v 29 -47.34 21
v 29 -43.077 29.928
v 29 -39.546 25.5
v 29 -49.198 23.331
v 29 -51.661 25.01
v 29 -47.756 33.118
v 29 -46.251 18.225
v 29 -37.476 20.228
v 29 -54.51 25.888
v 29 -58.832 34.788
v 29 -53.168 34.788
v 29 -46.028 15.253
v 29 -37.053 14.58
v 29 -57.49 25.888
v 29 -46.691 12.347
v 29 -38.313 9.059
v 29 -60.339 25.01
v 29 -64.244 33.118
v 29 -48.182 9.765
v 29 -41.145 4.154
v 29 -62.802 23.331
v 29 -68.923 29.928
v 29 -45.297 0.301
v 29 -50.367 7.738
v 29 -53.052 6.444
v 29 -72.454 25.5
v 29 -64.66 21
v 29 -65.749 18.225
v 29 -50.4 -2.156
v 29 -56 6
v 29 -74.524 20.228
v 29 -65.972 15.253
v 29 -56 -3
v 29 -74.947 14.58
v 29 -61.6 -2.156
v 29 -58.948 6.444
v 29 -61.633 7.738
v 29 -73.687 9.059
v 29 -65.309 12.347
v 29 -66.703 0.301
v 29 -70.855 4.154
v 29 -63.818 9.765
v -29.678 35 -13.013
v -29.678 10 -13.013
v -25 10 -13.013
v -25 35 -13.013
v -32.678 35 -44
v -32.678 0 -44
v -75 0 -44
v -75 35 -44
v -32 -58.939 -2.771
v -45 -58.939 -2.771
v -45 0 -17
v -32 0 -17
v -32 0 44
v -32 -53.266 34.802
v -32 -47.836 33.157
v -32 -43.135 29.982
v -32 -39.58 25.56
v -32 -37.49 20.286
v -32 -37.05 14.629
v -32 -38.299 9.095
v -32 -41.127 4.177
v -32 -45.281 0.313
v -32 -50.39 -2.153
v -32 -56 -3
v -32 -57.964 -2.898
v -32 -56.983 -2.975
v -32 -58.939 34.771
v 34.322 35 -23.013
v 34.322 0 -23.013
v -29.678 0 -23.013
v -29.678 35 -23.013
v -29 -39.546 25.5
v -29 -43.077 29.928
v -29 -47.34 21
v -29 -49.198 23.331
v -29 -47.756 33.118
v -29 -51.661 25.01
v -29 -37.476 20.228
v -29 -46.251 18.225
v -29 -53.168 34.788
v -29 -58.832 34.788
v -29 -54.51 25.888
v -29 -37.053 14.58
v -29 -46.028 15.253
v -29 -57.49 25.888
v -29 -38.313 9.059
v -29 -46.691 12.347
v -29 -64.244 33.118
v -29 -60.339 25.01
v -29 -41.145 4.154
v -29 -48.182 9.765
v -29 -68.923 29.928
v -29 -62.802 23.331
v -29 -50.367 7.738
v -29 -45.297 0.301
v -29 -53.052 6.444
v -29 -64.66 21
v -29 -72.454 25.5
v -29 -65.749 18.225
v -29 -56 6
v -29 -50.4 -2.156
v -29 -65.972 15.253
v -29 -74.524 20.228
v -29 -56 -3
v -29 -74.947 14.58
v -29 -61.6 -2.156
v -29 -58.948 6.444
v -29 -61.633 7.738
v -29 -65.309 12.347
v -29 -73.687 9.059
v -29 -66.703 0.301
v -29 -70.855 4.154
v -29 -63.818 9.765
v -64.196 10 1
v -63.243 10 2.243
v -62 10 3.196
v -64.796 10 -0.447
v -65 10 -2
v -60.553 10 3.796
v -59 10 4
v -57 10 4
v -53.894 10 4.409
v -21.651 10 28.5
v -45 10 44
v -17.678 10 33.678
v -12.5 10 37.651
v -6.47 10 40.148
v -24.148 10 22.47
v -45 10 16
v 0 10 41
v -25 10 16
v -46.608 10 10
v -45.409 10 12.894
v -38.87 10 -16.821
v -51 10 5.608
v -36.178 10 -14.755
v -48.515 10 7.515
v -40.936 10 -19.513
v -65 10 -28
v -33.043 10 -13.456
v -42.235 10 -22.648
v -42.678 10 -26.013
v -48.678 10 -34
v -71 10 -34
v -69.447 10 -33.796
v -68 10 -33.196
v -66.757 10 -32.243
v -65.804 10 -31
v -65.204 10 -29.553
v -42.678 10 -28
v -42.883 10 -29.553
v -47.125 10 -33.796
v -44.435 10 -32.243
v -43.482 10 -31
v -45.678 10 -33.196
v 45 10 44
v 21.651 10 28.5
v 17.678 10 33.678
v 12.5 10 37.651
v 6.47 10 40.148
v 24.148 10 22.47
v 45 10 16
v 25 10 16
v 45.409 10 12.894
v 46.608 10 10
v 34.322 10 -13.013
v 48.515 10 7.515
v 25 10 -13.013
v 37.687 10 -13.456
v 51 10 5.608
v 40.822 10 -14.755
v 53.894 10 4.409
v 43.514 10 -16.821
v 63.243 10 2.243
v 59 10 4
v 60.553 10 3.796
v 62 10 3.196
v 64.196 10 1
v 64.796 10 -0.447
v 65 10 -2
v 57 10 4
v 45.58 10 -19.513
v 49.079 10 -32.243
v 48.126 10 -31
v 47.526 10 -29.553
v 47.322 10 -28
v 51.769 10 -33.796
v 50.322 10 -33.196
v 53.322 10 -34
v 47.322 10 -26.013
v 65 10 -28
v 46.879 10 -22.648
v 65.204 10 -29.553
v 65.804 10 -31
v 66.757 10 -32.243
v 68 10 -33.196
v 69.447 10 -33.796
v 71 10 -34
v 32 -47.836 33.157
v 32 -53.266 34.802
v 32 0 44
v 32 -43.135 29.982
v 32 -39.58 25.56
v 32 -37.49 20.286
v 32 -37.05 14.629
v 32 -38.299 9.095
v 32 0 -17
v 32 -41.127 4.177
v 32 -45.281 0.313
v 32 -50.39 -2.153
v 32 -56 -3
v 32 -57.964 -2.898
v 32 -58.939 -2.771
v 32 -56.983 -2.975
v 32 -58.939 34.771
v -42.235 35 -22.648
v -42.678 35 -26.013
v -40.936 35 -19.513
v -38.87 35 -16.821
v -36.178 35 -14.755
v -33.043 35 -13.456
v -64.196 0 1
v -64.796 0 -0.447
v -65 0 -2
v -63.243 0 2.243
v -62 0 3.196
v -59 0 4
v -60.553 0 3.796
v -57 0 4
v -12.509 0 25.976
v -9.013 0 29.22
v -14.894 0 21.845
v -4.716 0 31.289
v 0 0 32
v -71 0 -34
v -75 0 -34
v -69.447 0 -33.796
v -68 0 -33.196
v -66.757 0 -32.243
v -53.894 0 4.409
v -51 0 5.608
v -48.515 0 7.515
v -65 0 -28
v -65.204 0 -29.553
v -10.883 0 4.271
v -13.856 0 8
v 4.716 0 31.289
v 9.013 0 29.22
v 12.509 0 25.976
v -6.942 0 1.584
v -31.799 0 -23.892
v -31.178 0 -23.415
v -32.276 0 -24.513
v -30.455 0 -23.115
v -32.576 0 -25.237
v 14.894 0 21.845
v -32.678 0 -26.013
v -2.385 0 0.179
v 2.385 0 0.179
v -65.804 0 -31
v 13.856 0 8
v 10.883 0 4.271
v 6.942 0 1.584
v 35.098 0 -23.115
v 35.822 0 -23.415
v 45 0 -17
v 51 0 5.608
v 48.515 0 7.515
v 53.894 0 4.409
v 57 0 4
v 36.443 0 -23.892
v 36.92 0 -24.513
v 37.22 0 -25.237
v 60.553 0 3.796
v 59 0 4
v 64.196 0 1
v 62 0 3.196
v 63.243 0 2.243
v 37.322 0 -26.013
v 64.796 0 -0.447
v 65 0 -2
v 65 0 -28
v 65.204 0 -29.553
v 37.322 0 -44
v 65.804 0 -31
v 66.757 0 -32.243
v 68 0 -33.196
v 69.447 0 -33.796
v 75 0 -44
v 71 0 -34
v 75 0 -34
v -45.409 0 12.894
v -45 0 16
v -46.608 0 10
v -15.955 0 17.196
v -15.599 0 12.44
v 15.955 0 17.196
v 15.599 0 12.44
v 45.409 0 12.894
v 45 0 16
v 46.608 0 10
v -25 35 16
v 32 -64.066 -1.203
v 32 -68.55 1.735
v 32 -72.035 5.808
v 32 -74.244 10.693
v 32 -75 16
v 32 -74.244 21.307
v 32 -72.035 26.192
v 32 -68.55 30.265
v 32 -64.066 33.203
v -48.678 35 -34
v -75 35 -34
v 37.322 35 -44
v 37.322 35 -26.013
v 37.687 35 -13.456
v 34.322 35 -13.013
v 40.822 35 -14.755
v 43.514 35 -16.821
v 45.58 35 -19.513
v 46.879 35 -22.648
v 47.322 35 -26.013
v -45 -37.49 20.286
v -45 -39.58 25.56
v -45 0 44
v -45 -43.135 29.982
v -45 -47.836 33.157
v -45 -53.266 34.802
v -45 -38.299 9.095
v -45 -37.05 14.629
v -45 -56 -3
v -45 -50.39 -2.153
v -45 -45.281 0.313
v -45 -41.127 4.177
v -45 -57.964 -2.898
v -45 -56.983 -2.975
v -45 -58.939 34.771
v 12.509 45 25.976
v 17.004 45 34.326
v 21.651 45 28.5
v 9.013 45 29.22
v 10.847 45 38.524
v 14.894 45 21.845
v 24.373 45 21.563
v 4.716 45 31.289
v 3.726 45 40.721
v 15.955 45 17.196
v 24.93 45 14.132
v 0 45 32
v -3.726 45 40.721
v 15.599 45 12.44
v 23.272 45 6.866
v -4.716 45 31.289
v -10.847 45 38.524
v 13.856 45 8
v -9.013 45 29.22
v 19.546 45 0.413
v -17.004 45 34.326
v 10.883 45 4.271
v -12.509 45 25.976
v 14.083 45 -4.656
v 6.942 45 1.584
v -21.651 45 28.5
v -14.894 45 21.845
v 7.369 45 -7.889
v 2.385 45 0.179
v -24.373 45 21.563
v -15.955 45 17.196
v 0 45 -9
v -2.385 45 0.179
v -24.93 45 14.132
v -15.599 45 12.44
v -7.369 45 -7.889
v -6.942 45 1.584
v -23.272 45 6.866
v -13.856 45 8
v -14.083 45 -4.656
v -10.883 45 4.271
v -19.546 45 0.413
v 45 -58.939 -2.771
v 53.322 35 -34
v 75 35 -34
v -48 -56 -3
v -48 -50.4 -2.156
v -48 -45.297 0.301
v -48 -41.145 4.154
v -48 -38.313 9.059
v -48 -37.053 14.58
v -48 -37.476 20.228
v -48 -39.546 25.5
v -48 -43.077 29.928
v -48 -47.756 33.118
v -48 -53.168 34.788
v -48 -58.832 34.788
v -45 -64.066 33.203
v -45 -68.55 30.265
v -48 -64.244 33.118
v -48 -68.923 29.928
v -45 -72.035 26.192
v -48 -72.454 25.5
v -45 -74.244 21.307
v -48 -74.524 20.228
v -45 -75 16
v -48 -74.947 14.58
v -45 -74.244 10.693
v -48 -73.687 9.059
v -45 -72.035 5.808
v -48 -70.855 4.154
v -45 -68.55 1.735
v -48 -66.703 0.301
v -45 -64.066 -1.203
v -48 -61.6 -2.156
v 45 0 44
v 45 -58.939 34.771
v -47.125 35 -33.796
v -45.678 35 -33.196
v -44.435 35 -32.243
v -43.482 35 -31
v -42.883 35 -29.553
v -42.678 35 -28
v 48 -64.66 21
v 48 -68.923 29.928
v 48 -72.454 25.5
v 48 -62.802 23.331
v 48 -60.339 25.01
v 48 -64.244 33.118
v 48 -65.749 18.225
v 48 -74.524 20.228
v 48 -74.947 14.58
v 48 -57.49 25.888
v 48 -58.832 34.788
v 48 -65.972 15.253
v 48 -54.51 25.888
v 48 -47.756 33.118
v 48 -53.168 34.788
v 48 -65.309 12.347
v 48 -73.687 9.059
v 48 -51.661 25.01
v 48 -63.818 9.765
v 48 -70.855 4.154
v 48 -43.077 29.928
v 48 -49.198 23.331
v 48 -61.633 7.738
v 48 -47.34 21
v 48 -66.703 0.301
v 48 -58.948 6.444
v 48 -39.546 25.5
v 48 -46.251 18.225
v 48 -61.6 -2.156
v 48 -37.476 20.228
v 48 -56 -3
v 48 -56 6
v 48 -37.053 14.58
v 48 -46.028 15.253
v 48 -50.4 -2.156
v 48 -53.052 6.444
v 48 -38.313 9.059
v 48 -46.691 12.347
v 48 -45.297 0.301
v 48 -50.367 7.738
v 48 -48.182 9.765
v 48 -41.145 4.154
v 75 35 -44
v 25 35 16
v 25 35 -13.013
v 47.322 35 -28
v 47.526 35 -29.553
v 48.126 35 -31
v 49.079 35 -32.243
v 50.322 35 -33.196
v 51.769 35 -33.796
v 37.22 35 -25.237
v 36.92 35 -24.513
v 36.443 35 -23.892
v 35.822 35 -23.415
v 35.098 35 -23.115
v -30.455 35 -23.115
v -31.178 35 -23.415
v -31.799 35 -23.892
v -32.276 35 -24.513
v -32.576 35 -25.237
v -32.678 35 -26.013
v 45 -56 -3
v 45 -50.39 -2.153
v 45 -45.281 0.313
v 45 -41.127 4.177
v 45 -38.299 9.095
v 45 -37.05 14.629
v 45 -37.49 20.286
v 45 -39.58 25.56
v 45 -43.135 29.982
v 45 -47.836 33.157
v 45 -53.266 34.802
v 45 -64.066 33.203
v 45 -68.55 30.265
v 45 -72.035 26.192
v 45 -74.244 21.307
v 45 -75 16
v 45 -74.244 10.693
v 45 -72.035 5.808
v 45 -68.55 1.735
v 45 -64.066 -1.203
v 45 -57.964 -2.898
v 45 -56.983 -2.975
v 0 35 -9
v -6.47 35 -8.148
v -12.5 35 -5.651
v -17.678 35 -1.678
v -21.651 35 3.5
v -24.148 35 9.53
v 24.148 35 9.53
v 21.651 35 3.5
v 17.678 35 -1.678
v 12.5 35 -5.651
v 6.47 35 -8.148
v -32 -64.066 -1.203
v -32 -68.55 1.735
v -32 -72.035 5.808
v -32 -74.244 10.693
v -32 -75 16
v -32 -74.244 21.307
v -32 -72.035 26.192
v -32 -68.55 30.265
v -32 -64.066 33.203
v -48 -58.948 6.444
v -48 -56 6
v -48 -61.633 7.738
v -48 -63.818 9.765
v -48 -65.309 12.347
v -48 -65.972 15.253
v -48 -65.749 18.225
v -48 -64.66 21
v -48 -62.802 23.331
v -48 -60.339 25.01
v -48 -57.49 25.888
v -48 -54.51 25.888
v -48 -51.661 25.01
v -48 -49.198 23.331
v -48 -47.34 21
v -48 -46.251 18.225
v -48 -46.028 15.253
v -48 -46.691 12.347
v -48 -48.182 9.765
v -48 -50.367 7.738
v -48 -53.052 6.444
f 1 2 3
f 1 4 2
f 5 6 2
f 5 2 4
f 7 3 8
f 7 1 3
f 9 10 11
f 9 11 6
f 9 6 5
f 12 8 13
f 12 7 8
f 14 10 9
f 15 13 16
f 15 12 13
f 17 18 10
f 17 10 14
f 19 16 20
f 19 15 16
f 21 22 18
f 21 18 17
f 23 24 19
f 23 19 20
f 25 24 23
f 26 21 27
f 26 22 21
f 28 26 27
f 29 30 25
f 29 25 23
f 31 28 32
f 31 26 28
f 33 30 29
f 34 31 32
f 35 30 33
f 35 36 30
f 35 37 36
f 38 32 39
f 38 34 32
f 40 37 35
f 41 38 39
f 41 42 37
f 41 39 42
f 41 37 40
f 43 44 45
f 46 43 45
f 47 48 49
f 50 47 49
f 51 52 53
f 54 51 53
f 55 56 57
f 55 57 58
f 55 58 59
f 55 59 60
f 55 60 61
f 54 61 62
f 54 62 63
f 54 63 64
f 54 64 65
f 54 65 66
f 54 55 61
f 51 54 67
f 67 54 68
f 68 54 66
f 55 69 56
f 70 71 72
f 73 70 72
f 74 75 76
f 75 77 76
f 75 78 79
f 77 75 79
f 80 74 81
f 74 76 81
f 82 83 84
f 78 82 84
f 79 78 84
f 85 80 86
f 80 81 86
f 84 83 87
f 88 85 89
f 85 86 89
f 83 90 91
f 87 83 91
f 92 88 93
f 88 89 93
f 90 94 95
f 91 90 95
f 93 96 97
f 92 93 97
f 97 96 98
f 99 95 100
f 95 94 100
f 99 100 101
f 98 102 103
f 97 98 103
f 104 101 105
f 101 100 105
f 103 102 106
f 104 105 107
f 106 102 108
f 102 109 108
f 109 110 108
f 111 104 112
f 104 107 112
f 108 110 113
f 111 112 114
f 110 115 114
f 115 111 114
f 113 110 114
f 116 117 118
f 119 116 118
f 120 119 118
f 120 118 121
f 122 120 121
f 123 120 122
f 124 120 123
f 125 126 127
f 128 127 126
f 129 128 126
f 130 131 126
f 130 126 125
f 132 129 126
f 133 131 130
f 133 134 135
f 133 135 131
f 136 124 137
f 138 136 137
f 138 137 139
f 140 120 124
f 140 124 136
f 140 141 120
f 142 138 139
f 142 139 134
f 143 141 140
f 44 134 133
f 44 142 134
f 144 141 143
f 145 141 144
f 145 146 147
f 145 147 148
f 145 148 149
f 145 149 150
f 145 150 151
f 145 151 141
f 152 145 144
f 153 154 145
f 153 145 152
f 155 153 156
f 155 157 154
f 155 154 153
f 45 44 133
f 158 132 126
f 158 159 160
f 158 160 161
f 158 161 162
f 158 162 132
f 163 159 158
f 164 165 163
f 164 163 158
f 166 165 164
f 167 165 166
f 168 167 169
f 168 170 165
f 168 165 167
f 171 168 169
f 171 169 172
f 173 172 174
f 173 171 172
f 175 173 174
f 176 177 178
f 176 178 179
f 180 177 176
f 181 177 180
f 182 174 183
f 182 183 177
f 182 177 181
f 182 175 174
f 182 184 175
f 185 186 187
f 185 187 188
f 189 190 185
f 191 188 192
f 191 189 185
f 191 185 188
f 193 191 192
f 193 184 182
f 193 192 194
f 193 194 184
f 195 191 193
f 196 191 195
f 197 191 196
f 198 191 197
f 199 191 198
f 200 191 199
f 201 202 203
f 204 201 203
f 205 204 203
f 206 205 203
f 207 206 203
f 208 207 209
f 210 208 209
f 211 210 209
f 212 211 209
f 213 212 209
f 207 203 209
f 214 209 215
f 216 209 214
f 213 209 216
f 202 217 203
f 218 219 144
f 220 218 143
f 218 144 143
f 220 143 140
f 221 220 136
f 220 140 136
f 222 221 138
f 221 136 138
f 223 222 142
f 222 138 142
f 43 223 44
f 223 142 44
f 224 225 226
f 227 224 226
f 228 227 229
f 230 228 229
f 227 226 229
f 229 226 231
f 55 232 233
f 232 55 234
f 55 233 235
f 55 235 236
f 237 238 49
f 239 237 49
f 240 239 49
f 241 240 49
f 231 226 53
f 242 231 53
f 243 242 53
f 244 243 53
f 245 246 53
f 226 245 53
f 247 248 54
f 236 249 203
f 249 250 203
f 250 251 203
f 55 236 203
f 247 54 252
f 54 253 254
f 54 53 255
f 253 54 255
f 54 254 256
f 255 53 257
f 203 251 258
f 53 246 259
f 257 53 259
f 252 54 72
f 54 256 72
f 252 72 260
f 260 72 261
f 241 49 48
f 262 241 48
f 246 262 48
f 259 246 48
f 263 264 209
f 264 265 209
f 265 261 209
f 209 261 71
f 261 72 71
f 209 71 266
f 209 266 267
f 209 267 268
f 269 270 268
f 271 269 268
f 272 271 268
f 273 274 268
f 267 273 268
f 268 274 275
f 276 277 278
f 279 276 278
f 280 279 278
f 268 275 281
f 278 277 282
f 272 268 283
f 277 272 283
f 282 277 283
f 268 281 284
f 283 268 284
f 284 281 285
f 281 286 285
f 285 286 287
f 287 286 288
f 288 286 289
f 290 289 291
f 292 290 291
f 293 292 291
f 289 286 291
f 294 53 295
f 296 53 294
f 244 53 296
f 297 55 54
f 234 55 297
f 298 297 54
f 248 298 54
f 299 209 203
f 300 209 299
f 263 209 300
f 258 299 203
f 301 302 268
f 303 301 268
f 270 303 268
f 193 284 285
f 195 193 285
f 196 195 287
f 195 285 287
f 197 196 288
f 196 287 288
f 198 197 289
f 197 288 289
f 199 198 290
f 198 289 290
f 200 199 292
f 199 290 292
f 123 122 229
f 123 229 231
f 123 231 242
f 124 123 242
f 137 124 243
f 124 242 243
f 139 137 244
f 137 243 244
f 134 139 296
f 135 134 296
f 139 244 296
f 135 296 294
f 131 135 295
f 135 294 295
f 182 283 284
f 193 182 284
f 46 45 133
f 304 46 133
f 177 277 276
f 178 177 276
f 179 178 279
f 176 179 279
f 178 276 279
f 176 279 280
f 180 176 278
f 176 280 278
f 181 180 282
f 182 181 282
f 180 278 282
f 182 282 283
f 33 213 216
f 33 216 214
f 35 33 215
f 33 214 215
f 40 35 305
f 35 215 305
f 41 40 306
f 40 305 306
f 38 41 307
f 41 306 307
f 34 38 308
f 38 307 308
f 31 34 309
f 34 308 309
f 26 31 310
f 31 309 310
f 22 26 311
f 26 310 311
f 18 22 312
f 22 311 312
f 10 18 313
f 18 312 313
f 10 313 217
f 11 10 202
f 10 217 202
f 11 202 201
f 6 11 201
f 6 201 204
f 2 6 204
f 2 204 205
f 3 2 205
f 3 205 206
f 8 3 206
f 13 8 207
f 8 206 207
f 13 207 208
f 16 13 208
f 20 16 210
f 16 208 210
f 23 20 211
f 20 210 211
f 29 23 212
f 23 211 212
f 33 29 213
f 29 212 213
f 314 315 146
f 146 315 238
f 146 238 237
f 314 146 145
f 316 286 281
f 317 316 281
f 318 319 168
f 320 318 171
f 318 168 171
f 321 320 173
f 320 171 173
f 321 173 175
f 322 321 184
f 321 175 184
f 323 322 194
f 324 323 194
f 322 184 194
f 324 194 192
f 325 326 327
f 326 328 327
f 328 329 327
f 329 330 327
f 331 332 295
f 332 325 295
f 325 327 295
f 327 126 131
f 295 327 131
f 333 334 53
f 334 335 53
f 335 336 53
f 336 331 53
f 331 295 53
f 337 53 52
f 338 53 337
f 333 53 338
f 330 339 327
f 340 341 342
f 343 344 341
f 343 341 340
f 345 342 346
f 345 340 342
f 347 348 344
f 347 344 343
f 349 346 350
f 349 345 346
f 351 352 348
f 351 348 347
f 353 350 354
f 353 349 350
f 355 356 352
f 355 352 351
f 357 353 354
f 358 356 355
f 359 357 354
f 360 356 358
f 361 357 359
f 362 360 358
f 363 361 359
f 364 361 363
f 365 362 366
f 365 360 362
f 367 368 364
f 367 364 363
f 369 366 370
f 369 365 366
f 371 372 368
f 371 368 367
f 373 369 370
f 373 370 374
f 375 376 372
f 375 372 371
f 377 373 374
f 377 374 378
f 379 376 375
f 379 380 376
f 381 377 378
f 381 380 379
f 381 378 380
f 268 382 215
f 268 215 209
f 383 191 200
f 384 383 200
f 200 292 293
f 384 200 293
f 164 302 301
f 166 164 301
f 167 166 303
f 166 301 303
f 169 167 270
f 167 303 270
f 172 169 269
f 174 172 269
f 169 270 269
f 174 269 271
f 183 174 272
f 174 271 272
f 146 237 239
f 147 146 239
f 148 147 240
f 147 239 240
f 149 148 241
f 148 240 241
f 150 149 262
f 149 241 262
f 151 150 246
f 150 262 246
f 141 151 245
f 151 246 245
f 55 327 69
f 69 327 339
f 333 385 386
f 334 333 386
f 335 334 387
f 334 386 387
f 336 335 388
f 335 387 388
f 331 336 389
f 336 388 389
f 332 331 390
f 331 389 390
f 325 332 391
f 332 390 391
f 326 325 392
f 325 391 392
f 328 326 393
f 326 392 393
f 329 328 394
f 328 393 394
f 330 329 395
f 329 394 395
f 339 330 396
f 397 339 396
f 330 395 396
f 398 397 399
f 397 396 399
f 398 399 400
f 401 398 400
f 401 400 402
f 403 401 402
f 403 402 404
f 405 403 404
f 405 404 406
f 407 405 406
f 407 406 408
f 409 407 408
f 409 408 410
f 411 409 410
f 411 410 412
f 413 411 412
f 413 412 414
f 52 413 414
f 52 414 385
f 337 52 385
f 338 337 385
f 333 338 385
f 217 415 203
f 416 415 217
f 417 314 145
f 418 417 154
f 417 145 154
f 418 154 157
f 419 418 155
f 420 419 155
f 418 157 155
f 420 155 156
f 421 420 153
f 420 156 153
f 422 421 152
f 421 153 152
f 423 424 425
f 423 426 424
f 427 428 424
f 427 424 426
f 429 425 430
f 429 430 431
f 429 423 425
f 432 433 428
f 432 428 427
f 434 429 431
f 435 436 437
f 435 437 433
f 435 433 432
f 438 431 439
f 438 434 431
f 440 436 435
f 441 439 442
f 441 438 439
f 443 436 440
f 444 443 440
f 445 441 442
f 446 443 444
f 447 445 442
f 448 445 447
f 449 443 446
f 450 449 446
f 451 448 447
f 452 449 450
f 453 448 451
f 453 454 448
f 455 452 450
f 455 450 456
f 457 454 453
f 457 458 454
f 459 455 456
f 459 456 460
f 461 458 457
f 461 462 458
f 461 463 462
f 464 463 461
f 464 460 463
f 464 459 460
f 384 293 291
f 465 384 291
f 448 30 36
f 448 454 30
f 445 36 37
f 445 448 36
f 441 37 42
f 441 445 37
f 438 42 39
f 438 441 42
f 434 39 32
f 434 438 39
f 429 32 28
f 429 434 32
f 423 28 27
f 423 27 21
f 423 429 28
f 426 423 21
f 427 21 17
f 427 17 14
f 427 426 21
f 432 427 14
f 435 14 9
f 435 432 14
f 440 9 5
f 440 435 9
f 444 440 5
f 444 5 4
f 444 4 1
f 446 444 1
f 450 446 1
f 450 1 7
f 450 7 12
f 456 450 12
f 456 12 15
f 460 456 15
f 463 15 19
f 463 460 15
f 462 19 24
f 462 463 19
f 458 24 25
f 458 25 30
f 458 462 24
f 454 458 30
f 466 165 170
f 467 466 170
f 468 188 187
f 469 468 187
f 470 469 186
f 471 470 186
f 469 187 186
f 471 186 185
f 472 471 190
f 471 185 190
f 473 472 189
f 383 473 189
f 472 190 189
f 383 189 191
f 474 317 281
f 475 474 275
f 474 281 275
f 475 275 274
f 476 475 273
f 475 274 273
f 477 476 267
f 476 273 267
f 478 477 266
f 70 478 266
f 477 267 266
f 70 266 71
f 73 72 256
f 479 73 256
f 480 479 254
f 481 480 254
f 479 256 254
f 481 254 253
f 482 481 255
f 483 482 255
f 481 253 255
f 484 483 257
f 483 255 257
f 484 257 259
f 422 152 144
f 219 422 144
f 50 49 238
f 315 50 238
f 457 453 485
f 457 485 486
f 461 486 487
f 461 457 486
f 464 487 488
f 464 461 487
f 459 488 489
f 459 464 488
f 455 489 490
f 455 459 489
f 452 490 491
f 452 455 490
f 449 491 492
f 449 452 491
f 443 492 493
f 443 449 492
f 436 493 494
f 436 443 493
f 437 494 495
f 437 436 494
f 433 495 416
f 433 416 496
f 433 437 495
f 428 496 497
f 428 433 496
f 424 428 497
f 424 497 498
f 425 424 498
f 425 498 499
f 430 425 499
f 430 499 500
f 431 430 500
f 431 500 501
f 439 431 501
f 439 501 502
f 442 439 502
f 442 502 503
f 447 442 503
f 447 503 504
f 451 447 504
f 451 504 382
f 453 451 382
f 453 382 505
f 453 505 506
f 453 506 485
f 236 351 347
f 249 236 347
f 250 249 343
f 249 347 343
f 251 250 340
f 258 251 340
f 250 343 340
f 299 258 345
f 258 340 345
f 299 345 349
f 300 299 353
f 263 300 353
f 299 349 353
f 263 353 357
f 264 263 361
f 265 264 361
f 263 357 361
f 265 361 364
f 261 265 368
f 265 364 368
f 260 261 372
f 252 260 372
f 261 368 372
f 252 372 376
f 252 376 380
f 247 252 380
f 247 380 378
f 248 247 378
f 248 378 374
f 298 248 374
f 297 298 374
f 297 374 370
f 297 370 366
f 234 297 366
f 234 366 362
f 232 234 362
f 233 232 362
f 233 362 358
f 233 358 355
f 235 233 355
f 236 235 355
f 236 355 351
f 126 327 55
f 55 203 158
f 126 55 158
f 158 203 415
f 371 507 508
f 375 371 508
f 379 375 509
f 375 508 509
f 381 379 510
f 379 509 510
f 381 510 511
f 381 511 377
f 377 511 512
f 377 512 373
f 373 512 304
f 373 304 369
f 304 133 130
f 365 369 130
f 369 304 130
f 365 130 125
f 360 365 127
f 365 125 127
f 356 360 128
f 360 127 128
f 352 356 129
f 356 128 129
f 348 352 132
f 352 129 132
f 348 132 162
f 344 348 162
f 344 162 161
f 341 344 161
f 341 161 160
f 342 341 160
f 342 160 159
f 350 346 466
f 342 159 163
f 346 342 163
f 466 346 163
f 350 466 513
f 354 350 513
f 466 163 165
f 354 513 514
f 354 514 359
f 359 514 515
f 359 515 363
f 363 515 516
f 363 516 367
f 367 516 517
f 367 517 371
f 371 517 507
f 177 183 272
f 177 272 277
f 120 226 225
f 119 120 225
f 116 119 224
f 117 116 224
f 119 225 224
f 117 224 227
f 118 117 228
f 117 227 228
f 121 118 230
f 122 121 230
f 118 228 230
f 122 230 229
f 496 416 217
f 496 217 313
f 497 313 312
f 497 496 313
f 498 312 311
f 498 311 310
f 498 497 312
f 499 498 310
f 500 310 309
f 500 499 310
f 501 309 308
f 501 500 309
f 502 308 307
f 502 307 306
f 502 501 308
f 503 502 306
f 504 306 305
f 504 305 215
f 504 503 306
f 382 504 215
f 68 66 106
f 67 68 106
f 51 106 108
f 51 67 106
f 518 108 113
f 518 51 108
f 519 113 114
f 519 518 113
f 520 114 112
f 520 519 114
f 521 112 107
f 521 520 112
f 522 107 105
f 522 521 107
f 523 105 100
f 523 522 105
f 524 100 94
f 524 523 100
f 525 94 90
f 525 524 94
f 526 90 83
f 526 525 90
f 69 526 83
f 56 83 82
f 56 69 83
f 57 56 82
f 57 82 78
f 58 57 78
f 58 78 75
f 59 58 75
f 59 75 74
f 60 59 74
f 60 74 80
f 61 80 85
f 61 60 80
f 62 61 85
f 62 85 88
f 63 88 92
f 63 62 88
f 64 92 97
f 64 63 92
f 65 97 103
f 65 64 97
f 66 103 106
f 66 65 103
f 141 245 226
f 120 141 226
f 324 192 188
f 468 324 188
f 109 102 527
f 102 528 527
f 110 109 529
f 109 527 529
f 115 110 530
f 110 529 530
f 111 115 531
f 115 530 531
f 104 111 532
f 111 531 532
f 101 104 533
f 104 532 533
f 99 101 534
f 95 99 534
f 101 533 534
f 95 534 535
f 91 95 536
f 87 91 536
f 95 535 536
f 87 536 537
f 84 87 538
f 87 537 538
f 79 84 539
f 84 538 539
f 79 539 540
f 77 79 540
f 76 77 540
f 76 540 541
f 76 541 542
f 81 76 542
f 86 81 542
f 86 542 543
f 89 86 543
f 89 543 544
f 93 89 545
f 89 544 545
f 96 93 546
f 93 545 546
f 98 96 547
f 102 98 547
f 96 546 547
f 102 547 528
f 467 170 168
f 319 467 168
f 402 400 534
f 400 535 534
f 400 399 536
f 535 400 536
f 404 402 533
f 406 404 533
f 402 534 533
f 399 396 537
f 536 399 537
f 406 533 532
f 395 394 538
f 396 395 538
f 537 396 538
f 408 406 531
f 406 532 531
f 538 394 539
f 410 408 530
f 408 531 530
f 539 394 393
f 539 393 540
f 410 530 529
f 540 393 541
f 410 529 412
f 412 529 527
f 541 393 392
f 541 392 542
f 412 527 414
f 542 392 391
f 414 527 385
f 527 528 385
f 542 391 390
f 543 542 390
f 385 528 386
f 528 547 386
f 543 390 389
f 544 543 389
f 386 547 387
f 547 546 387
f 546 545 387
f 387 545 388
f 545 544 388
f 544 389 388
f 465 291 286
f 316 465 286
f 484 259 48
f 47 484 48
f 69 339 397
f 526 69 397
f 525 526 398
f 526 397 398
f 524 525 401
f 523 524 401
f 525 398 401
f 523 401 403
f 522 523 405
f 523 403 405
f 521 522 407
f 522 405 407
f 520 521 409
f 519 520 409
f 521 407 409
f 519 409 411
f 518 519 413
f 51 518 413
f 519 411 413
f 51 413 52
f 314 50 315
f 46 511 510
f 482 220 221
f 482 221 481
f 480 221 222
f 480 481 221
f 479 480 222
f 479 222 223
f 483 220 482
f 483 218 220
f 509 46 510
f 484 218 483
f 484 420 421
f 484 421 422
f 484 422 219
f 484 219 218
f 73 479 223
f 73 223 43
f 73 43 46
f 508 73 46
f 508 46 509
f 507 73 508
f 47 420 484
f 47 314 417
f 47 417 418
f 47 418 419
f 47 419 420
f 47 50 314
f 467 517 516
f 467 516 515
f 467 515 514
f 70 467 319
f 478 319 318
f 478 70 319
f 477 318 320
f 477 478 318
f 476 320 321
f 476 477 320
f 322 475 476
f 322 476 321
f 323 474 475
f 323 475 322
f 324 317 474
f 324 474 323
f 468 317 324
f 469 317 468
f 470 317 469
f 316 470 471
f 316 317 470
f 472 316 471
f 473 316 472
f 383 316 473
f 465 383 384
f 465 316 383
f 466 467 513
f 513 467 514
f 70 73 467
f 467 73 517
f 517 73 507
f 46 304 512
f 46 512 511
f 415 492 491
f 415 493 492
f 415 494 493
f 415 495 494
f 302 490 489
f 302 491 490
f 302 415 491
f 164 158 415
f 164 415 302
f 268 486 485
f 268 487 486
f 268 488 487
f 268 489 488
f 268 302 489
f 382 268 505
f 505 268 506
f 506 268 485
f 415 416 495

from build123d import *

# Parameters (mm, degrees)
SKETCH1_R           = 25
BOSS_EXTRUDE1_DEPTH = 45
BOSS_EXTRUDE2_DEPTH = 35
BOSS_EXTRUDE3_DEPTH = 10
SKETCH2_R           = 16
CUT_EXTRUDE1_DEPTH  = 82
SKETCH3_R           = 10
BOSS_EXTRUDE6_DEPTH = 13
BOSS_EXTRUDE7_START = 3
SKETCH6_R           = 19
SKETCH6_R_2         = 10
BOSS_EXTRUDE7_DEPTH = 3
SKETCH7_R           = 19
SKETCH7_R_2         = 10
BOSS_EXTRUDE8_DEPTH = 3


with BuildPart() as part:
    # Sketch1 → Boss-Extrude1 (new body)
    with BuildSketch(Plane(origin=(0, 0, 0), x_dir=(1, 0, 0), z_dir=(0, 1, 0))):
        with Locations((0, -16)):
            Circle(SKETCH1_R)
    extrude(amount=BOSS_EXTRUDE1_DEPTH)

    # Sketch1<3> → Boss-Extrude2 (add)
    with BuildSketch(Plane(origin=(0, 0, 0), x_dir=(1, 0, 0), z_dir=(0, 1, 0))):
        with BuildLine():
            Line((-25, 13.01303268), (-25, -16))
            ThreePointArc((-25, -16), (0, 9), (25, -16))
            Line((25, -16), (25, 13.01303268))
            Line((25, 13.01303268), (34.321906288, 13.01303268))
            ThreePointArc((34.321906288, 13.01303268), (43.514294444, 16.820644525), (47.321906288, 26.01303268))
            Line((47.321906288, 26.01303268), (47.321906288, 28))
            ThreePointArc((47.321906288, 28), (49.079265601, 32.242640687), (53.321906288, 34))
            Line((53.321906288, 34), (75, 34))
            Line((75, 34), (75, 44))
            Line((75, 44), (37.321906288, 44))
            Line((37.321906288, 44), (37.321906288, 26.01303268))
            ThreePointArc((37.321906288, 26.01303268), (36.443226632, 23.891712336), (34.321906288, 23.01303268))
            Line((34.321906288, 23.01303268), (-29.678093712, 23.01303268))
            ThreePointArc((-29.678093712, 23.01303268), (-31.799414055, 23.891712336), (-32.678093712, 26.01303268))
            Line((-32.678093712, 26.01303268), (-32.678093712, 44))
            Line((-32.678093712, 44), (-75, 44))
            Line((-75, 44), (-75, 34))
            Line((-75, 34), (-48.678093712, 34))
            ThreePointArc((-48.678093712, 34), (-44.435453024, 32.242640687), (-42.678093712, 28))
            Line((-42.678093712, 28), (-42.678093712, 26.01303268))
            ThreePointArc((-42.678093712, 26.01303268), (-38.870481867, 16.820644525), (-29.678093712, 13.01303268))
            Line((-29.678093712, 13.01303268), (-25, 13.01303268))
        make_face()
    extrude(amount=BOSS_EXTRUDE2_DEPTH)

    # Sketch1<4> → Boss-Extrude3 (add)
    with BuildSketch(Plane(origin=(0, 0, 0), x_dir=(1, 0, 0), z_dir=(0, 1, 0))):
        with BuildLine():
            Line((-45, -16), (-45, -44))
            Line((-45, -44), (45, -44))
            Line((45, -44), (45, -16))
            ThreePointArc((45, -16), (48.514718626, -7.514718626), (57, -4))
            Line((57, -4), (59, -4))
            ThreePointArc((59, -4), (63.242640687, -2.242640687), (65, 2))
            Line((65, 2), (65, 28))
            ThreePointArc((65, 28), (66.757359313, 32.242640687), (71, 34))
            Line((71, 34), (53.321906288, 34))
            ThreePointArc((53.321906288, 34), (49.079265601, 32.242640687), (47.321906288, 28))
            Line((47.321906288, 28), (47.321906288, 26.01303268))
            ThreePointArc((47.321906288, 26.01303268), (43.514294444, 16.820644525), (34.321906288, 13.01303268))
            Line((34.321906288, 13.01303268), (25, 13.01303268))
            Line((25, 13.01303268), (25, -16))
            ThreePointArc((25, -16), (0, -41), (-25, -16))
            Line((-25, -16), (-25, 13.01303268))
            Line((-25, 13.01303268), (-29.678093712, 13.01303268))
            ThreePointArc((-29.678093712, 13.01303268), (-38.870481867, 16.820644525), (-42.678093712, 26.01303268))
            Line((-42.678093712, 26.01303268), (-42.678093712, 28))
            ThreePointArc((-42.678093712, 28), (-44.435453024, 32.242640687), (-48.678093712, 34))
            Line((-48.678093712, 34), (-71, 34))
            ThreePointArc((-71, 34), (-66.757359313, 32.242640687), (-65, 28))
            Line((-65, 28), (-65, 2))
            ThreePointArc((-65, 2), (-63.242640687, -2.242640687), (-59, -4))
            Line((-59, -4), (-57, -4))
            ThreePointArc((-57, -4), (-48.514718626, -7.514718626), (-45, -16))
        make_face()
    extrude(amount=BOSS_EXTRUDE3_DEPTH)

    # Sketch2 → Cut-Extrude1 (cut)
    with BuildSketch(Plane(origin=(0, 45, 0), x_dir=(1, 0, 0), z_dir=(0, 1, 0))):
        with Locations((0, -16)):
            Circle(SKETCH2_R)
    extrude(amount=-CUT_EXTRUDE1_DEPTH, mode=Mode.SUBTRACT)

    # Sketch3 → Boss-Extrude6 (add)
    with BuildSketch(Plane(origin=(45, 0, 0), x_dir=(0, 0, -1), z_dir=(1, 0, 0))):
        with BuildLine():
            Line((17, 0), (-44, 0))
            Line((-44, 0), (-34.771282059, -58.939212458))
            ThreePointArc((-34.771282059, -58.939212458), (-16, -75), (2.771282059, -58.939212458))
            Line((2.771282059, -58.939212458), (17, 0))
        make_face()
        with Locations((-16, -56)):
            Circle(SKETCH3_R, mode=Mode.SUBTRACT)
    boss_extrude6 = extrude(amount=-BOSS_EXTRUDE6_DEPTH)

    # Sketch6 → Boss-Extrude7 (add)
    with BuildSketch(Plane(origin=(45, 0, 0), x_dir=(0, 0, -1), z_dir=(1, 0, 0)).offset(BOSS_EXTRUDE7_START)):
        with Locations((-16, -56)):
            Circle(SKETCH6_R)
        with Locations((-16, -56)):
            Circle(SKETCH6_R_2, mode=Mode.SUBTRACT)
    boss_extrude7 = extrude(amount=-BOSS_EXTRUDE7_DEPTH)

    # Sketch7 → Boss-Extrude8 (add)
    with BuildSketch(Plane.ZY.offset(-32)):
        with Locations((16, -56)):
            Circle(SKETCH7_R)
        with Locations((16, -56)):
            Circle(SKETCH7_R_2, mode=Mode.SUBTRACT)
    boss_extrude8 = extrude(amount=BOSS_EXTRUDE8_DEPTH)

    # Mirror1: Boss-Extrude6, Boss-Extrude7, Boss-Extrude8 across plane
    add(boss_extrude6.mirror(Plane(origin=(0, 0, 0), x_dir=(0, 0, 1), z_dir=(1, 0, 0))))
    add(boss_extrude7.mirror(Plane(origin=(0, 0, 0), x_dir=(0, 0, 1), z_dir=(1, 0, 0))))
    add(boss_extrude8.mirror(Plane(origin=(0, 0, 0), x_dir=(0, 0, 1), z_dir=(1, 0, 0))))


solid = part.part
